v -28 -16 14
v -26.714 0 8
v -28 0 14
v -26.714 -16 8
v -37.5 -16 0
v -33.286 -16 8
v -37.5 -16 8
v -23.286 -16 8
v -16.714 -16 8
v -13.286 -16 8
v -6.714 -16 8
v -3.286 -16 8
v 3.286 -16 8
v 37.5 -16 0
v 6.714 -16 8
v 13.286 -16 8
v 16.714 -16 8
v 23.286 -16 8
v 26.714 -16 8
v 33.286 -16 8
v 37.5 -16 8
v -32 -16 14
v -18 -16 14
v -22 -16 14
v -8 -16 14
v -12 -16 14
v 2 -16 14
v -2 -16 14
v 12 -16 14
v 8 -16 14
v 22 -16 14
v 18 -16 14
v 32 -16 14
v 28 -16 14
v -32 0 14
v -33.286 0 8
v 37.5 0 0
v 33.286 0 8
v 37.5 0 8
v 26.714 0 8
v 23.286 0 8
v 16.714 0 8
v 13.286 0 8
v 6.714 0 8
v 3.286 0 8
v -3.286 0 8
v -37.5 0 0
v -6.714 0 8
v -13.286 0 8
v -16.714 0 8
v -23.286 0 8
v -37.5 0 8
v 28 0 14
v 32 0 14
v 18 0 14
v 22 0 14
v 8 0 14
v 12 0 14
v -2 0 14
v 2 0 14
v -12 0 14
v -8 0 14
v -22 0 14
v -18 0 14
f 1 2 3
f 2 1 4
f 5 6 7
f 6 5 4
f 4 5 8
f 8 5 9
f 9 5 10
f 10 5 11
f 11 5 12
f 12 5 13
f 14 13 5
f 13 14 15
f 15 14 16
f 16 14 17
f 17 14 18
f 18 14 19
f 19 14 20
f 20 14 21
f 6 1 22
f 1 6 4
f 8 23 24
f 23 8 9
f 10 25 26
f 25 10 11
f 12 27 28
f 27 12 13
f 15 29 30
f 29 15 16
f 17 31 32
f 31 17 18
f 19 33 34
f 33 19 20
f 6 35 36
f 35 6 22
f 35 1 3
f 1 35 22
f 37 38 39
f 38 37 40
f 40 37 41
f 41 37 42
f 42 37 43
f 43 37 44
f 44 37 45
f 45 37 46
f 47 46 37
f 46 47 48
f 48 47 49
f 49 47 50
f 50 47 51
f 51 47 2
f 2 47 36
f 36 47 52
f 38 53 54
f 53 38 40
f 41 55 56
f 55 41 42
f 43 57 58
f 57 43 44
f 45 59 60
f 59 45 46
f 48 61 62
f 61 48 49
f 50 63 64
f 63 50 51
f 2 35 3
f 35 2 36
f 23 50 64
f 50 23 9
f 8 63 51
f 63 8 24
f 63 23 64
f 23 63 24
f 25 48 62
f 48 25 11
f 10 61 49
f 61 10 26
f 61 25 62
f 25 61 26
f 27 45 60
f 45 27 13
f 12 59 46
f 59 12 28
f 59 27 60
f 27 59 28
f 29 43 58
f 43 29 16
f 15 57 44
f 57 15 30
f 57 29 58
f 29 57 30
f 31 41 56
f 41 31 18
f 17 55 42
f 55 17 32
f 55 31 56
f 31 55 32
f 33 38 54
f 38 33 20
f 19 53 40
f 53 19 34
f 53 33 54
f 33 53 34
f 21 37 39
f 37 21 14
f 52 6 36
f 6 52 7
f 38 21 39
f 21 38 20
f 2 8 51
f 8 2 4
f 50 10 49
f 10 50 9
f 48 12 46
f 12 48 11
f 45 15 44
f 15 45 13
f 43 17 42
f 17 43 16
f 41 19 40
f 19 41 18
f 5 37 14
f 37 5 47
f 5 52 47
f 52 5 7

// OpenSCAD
$fn = 32;

// ----------------------------------------------------------------------
// Toothed rack, 7 teeth
// 10 mm pitch, 6 mm teeth
// ----------------------------------------------------------------------

// --- parameters (mm) ---
bar_w = 16;   // bar width (Y)
bar_h = 8;    // bar height (Z)
teeth = 7;    // number of teeth
pitch = 10;   // tooth pitch
tooth_h = 6;  // tooth height above the bar
root_w = 7;   // tooth width at the root
crest_w = 4;  // tooth width at the crest

// --- derived feature positions (mm) ---
span = (teeth - 1) * pitch;  // = 60   distance between the outer teeth
bar_l = span + root_w + 8;   // = 75   bar length: teeth plus 4 mm at each end
tooth_x = -span / 2;         // = -30   X of the first tooth
height = bar_h + tooth_h;    // = 14   overall height
feature_centers = [
  [tooth_x + 0 * pitch, -bar_w / 2],
  [tooth_x + 1 * pitch, -bar_w / 2],
  [tooth_x + 2 * pitch, -bar_w / 2],
  [tooth_x + 3 * pitch, -bar_w / 2],
  [tooth_x + 4 * pitch, -bar_w / 2],
  [tooth_x + 5 * pitch, -bar_w / 2],
  [tooth_x + 6 * pitch, -bar_w / 2]
];   // tooth centre line, drives the tooth loop

// bar with a rack of teeth, one extruded trapezoium per centre
module rack_tooth() {
  linear_extrude(height = bar_w)
    polygon(points = [
      [0, 0],
      [root_w, 0],
      [root_w / 2 + crest_w / 2, tooth_h + 1],
      [root_w / 2 - crest_w / 2, tooth_h + 1]
    ]);
}

union() {
  translate([-bar_l / 2, -bar_w, 0]) cube([bar_l, bar_w, bar_h]);
  for (centre = feature_centers)
    translate([centre[0] - root_w / 2, 0, bar_h - 1]) rotate([90, 0, 0]) rack_tooth();
}
